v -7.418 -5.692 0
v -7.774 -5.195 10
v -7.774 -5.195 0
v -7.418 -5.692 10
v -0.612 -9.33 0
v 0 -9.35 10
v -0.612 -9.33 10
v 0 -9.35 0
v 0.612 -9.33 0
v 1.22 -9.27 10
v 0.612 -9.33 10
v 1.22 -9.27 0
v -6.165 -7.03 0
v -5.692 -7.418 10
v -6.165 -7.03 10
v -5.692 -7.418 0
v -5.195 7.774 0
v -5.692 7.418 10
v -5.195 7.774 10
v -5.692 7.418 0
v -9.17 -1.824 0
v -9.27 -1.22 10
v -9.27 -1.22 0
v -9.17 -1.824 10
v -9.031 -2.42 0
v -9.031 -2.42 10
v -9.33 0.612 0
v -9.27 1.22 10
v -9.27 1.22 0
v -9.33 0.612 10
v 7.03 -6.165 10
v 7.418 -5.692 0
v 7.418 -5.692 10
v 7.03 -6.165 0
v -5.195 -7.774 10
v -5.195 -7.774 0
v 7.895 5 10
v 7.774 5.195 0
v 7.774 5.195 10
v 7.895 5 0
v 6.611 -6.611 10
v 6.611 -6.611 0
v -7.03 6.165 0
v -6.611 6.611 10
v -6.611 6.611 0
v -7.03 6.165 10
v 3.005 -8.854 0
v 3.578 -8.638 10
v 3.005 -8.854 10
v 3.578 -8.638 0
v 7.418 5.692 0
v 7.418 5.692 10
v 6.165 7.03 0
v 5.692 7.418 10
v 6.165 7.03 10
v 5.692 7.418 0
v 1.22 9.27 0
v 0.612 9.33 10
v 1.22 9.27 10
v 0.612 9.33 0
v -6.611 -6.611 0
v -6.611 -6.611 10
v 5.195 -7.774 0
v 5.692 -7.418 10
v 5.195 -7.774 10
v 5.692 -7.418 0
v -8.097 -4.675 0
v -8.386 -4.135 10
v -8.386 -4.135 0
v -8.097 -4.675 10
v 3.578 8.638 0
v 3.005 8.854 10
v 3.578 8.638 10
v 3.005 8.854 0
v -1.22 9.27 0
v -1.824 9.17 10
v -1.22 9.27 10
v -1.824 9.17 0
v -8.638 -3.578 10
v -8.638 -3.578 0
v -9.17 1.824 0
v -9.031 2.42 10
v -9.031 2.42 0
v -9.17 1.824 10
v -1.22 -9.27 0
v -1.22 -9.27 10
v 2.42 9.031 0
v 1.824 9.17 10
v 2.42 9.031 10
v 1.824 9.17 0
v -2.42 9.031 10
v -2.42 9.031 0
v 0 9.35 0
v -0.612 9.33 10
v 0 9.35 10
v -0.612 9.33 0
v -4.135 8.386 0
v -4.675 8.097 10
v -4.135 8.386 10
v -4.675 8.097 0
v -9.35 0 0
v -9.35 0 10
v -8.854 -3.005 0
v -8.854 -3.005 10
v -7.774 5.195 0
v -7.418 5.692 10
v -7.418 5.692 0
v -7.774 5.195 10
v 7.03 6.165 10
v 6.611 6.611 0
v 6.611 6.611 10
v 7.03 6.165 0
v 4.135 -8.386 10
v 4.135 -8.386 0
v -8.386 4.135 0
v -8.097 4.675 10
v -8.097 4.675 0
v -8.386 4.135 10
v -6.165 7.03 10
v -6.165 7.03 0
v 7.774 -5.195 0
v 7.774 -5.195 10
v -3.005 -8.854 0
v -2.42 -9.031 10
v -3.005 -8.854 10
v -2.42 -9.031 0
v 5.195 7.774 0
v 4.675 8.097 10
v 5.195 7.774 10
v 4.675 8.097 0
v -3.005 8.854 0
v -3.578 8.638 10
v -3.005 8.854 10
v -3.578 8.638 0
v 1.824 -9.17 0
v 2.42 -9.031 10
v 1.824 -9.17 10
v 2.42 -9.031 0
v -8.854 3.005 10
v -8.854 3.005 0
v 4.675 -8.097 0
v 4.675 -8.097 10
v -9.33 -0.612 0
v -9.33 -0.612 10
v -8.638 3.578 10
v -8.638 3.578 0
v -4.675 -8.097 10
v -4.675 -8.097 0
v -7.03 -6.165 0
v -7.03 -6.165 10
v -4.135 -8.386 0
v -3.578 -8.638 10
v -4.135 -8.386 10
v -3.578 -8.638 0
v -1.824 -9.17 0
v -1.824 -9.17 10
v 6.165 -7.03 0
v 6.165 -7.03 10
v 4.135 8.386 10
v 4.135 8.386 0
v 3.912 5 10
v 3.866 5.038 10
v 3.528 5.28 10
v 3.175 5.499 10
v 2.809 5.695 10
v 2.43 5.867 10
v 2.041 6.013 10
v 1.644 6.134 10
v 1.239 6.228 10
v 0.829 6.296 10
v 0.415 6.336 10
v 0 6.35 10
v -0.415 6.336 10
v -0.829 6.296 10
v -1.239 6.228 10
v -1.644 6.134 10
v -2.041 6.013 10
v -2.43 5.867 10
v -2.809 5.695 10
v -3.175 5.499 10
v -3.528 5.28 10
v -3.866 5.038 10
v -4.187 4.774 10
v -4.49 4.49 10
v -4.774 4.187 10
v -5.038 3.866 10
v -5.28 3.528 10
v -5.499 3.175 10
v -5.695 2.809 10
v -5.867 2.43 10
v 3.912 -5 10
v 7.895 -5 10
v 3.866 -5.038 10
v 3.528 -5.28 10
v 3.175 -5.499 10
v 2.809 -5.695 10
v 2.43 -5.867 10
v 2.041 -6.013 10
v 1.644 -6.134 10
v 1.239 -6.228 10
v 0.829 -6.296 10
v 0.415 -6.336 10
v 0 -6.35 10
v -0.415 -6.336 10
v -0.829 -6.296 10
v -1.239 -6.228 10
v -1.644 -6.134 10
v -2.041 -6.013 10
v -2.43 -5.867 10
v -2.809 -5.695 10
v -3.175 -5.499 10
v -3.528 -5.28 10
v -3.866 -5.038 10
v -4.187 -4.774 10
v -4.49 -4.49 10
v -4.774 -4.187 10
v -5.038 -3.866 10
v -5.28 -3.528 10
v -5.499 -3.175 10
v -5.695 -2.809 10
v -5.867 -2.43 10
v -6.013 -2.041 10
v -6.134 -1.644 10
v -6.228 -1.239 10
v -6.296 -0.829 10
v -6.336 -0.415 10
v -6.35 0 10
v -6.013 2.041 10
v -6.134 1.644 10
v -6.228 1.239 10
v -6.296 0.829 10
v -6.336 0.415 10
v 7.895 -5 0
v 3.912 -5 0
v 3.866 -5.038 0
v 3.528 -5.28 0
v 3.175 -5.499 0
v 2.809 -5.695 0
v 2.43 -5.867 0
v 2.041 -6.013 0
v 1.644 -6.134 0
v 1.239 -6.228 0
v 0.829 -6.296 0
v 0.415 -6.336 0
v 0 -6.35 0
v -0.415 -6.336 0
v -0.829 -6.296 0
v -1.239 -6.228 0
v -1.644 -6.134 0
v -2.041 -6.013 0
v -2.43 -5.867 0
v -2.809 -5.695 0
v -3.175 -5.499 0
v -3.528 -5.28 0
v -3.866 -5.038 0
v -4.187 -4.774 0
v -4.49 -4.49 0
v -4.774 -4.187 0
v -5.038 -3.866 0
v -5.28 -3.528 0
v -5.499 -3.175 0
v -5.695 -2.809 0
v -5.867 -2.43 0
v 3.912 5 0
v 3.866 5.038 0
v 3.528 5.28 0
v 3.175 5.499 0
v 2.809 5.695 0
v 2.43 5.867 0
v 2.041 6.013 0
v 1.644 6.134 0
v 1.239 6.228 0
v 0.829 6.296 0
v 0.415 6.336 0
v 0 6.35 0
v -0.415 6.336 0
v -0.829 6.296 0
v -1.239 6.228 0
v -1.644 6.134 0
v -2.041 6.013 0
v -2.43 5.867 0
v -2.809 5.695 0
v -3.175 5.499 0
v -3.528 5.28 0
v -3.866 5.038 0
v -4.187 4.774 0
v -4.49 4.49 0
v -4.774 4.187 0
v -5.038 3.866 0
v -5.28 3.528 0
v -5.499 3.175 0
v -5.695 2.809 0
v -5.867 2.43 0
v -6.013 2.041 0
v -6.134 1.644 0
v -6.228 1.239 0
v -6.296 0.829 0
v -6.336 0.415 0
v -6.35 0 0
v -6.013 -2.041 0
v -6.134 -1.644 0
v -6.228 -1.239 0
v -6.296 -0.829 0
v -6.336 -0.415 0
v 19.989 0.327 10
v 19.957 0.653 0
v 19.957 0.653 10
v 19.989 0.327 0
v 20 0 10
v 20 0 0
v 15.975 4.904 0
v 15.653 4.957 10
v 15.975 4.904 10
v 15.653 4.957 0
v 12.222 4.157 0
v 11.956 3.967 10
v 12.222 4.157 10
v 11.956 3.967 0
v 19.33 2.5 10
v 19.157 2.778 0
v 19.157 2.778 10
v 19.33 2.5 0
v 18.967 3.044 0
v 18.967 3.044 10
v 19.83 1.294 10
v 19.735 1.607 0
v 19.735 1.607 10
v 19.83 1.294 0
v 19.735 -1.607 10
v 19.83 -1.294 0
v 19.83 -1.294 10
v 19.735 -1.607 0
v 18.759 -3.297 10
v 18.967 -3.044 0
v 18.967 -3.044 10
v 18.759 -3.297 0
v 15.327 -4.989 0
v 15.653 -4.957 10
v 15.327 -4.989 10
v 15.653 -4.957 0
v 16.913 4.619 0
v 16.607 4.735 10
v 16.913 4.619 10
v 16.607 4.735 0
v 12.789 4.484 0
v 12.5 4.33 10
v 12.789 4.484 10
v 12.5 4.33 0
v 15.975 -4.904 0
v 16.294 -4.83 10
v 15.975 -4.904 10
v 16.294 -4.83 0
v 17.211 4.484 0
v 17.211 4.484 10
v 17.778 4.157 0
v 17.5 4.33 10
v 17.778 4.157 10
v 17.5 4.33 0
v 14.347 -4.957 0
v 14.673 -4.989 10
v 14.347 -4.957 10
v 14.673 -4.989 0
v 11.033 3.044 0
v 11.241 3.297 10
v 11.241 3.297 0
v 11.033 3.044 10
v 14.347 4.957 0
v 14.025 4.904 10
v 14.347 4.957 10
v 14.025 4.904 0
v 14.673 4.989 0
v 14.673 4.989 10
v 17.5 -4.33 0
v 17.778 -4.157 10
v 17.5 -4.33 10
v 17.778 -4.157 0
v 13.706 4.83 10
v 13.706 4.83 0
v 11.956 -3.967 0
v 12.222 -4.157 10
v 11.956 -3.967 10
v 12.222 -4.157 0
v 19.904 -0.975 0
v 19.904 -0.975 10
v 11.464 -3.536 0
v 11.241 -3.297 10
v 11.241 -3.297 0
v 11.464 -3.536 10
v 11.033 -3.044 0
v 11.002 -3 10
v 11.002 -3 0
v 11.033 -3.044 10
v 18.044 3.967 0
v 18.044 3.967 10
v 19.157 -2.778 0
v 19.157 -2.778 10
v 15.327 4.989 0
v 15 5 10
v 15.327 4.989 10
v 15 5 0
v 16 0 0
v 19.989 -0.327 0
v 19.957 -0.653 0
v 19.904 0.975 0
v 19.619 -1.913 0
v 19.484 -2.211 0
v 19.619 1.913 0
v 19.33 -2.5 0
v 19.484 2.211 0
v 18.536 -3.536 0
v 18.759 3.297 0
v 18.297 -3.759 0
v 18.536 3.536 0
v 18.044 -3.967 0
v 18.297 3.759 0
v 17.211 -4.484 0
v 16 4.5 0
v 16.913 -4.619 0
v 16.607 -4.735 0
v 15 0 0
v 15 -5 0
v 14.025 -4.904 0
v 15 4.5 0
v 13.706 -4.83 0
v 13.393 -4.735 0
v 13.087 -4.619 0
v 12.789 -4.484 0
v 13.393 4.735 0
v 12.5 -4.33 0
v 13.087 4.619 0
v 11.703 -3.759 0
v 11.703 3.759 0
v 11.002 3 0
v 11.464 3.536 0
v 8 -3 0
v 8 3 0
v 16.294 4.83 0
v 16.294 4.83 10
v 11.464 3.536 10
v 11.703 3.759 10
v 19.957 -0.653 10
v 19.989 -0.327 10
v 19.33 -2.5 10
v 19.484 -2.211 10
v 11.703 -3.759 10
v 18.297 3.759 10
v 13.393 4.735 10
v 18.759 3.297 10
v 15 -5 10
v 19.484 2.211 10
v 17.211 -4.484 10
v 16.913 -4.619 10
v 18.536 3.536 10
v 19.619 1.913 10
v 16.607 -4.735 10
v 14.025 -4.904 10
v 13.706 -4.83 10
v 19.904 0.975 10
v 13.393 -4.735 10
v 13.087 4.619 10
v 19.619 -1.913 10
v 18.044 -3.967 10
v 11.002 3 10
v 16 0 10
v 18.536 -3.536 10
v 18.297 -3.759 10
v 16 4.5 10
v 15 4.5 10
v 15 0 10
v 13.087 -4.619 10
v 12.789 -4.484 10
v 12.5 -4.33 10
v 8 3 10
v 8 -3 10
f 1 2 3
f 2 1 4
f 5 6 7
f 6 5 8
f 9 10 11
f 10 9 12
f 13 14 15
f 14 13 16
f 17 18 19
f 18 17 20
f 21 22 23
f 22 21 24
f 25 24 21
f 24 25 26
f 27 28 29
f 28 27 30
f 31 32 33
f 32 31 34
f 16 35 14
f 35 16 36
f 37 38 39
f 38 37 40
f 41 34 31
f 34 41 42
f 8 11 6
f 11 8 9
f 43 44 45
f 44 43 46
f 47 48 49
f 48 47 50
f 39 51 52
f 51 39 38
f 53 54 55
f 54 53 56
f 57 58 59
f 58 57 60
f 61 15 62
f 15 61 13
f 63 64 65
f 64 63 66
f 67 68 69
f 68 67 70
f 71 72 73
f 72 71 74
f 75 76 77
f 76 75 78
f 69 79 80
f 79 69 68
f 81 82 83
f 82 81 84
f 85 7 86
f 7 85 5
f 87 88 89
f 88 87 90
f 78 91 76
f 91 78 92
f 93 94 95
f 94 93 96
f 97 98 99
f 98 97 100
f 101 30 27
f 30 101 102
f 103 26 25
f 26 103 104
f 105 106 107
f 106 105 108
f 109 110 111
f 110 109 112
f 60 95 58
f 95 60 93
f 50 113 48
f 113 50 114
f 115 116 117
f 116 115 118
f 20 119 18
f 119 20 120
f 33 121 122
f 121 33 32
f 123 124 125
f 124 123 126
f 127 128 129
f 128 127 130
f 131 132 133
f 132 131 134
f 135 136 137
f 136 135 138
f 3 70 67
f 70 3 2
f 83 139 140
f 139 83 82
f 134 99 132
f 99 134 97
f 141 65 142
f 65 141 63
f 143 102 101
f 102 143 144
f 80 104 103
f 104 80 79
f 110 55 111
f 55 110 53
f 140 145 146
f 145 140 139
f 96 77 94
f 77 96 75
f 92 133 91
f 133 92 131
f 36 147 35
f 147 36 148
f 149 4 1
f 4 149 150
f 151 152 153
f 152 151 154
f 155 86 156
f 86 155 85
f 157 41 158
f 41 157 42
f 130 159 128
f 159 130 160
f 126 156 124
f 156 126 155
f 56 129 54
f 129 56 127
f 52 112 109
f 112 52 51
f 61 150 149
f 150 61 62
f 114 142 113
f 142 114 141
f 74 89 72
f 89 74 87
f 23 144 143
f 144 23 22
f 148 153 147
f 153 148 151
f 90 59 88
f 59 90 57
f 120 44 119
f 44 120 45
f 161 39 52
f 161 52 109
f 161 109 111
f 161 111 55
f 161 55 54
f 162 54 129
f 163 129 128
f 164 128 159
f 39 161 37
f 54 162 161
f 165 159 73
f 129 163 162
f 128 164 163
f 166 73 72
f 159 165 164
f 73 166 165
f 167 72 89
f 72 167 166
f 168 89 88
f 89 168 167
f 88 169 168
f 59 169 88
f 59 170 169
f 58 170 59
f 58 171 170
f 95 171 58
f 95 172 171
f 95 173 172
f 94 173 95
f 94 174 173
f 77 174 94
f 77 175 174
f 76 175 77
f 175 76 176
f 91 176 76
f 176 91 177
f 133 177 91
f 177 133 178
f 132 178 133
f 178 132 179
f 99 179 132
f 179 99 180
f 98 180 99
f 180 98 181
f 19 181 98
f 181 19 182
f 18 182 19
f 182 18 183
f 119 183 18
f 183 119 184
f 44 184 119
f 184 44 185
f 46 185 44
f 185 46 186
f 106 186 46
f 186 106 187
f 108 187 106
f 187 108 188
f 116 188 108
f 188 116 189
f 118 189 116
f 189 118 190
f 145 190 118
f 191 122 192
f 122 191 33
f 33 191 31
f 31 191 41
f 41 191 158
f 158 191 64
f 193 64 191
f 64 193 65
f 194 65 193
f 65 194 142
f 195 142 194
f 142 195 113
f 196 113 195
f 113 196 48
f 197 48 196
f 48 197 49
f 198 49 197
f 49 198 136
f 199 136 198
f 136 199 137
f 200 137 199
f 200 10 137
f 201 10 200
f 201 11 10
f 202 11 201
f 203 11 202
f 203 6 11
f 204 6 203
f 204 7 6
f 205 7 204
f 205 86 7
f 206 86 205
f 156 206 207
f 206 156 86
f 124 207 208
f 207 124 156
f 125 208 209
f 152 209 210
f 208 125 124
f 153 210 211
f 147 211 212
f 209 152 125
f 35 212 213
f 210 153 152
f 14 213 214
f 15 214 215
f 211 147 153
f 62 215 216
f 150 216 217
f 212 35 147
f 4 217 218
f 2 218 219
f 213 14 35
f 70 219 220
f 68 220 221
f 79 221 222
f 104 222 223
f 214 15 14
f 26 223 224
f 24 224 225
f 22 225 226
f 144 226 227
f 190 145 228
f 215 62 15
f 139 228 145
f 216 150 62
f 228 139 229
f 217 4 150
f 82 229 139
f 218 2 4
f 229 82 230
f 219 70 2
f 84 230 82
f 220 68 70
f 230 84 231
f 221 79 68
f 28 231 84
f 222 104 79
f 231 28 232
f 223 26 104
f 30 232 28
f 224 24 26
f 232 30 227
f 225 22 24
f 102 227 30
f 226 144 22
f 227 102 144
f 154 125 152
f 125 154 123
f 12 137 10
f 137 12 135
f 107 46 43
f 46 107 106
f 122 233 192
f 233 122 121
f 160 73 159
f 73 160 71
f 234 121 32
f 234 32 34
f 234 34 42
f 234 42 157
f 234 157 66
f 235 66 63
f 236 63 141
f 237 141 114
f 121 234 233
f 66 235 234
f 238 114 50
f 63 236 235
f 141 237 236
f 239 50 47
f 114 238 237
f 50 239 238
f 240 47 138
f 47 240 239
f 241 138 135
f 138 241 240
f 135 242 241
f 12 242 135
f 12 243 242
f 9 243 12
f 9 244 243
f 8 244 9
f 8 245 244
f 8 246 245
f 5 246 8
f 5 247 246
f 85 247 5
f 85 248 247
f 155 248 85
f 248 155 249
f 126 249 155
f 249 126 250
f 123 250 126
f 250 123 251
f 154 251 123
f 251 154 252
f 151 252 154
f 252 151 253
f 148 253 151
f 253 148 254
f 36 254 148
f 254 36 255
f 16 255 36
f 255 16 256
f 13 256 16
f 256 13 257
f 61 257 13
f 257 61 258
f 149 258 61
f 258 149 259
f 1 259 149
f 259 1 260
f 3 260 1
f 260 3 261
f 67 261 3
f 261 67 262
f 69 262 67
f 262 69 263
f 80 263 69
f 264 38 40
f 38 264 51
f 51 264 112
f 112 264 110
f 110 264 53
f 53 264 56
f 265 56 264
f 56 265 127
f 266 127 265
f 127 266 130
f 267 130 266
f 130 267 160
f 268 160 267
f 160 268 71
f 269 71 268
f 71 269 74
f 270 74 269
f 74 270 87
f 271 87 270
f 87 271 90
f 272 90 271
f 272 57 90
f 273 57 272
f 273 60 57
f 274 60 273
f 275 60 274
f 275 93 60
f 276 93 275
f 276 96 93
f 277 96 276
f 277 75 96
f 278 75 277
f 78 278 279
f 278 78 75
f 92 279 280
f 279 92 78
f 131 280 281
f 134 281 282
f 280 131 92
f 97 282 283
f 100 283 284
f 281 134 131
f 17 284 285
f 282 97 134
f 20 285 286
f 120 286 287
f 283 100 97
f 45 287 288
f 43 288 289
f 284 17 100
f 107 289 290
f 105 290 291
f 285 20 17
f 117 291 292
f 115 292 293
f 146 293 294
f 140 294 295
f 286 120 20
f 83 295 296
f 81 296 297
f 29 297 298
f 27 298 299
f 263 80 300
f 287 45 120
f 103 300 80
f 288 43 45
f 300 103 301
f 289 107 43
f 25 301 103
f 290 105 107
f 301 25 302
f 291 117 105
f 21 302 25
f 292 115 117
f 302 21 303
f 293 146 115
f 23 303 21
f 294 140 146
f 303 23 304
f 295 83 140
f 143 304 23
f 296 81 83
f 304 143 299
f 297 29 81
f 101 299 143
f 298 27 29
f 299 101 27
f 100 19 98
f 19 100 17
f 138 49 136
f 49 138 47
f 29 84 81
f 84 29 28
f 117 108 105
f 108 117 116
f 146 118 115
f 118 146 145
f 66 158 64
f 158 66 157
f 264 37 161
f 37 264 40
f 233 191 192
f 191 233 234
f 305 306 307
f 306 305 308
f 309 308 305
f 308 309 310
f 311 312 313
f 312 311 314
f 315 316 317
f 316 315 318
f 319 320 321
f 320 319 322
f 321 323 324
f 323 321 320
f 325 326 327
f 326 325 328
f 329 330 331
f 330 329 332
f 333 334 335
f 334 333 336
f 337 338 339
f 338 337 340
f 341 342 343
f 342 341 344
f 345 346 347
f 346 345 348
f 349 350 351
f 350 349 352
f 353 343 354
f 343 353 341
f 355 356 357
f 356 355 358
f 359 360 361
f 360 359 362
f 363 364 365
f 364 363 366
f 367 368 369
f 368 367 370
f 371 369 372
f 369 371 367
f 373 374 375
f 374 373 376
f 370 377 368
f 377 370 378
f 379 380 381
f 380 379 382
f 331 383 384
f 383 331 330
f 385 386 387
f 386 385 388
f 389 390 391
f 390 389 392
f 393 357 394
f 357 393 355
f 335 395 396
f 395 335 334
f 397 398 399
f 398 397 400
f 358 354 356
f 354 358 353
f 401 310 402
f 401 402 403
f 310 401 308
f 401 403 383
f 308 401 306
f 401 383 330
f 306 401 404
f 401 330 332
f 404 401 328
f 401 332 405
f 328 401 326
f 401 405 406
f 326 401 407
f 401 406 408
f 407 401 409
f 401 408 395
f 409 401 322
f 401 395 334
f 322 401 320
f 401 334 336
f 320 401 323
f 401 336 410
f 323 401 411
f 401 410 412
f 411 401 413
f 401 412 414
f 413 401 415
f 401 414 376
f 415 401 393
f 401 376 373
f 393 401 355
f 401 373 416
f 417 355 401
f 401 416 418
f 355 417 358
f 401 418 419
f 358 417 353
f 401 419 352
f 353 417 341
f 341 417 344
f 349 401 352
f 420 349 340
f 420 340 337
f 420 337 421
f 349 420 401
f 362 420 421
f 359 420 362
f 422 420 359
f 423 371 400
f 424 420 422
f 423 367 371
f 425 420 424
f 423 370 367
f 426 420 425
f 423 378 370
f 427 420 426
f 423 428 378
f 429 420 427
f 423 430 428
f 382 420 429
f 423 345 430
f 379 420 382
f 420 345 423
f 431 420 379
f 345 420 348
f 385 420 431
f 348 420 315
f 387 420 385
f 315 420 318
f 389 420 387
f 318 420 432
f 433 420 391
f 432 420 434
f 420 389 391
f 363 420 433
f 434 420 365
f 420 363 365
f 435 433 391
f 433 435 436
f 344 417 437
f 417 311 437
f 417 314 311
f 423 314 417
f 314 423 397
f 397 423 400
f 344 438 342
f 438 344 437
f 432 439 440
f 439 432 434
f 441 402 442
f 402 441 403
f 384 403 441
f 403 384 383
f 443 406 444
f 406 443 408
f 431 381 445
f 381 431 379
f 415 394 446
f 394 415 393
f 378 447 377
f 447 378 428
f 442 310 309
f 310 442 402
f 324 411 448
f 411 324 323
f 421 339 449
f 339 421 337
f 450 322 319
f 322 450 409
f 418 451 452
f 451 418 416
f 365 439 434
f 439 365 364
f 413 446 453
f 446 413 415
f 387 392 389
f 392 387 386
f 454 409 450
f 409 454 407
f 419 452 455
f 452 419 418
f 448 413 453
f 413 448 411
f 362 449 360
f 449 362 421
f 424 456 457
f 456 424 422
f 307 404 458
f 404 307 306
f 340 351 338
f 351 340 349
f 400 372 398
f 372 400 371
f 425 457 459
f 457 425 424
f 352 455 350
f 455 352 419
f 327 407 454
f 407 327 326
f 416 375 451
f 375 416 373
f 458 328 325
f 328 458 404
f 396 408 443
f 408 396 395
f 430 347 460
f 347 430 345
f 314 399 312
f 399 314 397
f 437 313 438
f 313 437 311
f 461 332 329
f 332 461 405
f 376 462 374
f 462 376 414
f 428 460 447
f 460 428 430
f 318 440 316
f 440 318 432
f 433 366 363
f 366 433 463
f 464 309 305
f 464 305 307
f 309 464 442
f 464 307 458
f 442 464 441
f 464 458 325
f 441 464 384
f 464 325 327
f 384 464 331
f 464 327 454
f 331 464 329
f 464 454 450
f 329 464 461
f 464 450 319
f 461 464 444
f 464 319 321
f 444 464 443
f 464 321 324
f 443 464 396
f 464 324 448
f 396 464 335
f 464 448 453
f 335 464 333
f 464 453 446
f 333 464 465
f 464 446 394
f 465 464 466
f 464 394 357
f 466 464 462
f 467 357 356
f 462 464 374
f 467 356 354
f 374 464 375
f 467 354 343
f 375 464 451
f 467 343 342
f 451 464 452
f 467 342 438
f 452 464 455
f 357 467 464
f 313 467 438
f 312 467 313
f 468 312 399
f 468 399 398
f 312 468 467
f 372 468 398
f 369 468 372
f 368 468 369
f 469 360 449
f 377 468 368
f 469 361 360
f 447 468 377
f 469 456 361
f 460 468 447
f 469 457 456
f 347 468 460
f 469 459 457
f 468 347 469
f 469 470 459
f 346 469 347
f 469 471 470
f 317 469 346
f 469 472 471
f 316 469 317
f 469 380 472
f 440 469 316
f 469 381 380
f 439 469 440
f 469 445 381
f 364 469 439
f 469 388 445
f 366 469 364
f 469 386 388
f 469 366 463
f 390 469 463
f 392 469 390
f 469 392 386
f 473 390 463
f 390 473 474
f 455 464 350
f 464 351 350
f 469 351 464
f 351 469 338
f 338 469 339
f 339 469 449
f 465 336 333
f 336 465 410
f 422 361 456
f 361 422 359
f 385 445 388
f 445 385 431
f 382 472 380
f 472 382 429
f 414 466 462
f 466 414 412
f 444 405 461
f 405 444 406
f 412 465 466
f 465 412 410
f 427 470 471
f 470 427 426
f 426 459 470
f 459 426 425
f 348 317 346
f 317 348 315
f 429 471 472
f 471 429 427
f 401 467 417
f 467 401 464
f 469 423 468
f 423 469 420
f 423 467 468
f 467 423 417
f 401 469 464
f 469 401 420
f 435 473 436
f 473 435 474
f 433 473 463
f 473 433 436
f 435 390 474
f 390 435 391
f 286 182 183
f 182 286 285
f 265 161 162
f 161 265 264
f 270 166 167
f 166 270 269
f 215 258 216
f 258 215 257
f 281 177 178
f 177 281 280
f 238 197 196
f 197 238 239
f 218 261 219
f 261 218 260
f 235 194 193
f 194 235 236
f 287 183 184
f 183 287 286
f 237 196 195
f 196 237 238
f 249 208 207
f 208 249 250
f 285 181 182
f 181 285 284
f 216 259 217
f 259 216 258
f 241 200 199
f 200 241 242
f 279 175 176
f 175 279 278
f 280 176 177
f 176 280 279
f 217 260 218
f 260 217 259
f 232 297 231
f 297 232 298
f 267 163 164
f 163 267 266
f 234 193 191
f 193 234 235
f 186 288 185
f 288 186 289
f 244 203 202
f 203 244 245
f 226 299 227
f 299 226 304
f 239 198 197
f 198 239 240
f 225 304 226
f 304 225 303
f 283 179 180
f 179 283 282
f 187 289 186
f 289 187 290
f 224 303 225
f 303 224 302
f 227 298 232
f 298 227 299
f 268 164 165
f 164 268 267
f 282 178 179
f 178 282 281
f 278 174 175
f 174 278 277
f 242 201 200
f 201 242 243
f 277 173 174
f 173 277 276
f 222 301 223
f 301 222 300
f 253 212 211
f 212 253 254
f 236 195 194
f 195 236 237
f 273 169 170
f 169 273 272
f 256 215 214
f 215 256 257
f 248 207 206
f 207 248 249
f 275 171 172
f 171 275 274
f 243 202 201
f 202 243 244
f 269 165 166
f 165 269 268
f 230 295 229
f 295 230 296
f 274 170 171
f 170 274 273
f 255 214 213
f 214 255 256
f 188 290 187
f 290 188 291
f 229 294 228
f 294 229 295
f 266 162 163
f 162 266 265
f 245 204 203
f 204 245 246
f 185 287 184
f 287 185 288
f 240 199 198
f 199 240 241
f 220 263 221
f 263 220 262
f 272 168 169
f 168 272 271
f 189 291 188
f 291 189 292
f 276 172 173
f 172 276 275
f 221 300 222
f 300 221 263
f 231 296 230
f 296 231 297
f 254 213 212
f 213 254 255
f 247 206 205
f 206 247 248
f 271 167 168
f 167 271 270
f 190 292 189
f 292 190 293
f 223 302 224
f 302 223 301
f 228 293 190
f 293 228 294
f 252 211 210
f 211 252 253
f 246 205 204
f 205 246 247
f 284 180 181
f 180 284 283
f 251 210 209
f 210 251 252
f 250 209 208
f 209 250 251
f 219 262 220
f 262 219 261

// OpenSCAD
// Snap-on tubing clip for a 12.7 mm (1/2 inch) lab stand rod
// Print orientation: flat on the bed, builds upward in +Z

// ---------- Parameters ----------
rod_d      = 12.7;   // stand rod diameter
ring_w     = 3;      // rod ring wall thickness
opening_w  = 10;     // rod ring opening width (on -X side)

tub_d      = 6;      // tubing ring inner diameter
tub_x      = 15;     // tubing ring centre X
tub_w      = 2;      // tubing ring wall thickness
tub_open   = 4.5;    // tubing ring opening width (on +X side)

bridge_x0  = 8;      // bridge start X
bridge_x1  = 12;     // bridge end X
bridge_w   = 6;      // bridge width (Y)

h          = 10;     // clip height (Z)
eps        = 0.5;    // cutter overshoot

$fn = 96;

// ---------- Model ----------
difference() {
    union() {
        // Rod ring
        difference() {
            cylinder(d = rod_d + 2 * ring_w, h = h);
            // opening: x < 0, -5 < y < 5
            translate([-eps, -5, -eps])
                cube([opening_w + 2 * eps, 10, h + 2 * eps]);
        }

        // Tubing ring
        difference() {
            translate([tub_x, 0, 0])
                cylinder(d = tub_d + 2 * tub_w, h = h);
            // opening: x > 15, -2.25 < y < 2.25
            translate([tub_x, 0, -eps])
                cube([eps + 0.5, tub_open, h + 2 * eps]);
        }

        // Solid bridge
        translate([bridge_x0, -bridge_w / 2, 0])
            cube([bridge_x1 - bridge_x0, bridge_w, h]);
    }

    // Keep the stand rod hole clear
    translate([0, 0, -eps])
        cylinder(d = rod_d, h = h + 2 * eps);
}
